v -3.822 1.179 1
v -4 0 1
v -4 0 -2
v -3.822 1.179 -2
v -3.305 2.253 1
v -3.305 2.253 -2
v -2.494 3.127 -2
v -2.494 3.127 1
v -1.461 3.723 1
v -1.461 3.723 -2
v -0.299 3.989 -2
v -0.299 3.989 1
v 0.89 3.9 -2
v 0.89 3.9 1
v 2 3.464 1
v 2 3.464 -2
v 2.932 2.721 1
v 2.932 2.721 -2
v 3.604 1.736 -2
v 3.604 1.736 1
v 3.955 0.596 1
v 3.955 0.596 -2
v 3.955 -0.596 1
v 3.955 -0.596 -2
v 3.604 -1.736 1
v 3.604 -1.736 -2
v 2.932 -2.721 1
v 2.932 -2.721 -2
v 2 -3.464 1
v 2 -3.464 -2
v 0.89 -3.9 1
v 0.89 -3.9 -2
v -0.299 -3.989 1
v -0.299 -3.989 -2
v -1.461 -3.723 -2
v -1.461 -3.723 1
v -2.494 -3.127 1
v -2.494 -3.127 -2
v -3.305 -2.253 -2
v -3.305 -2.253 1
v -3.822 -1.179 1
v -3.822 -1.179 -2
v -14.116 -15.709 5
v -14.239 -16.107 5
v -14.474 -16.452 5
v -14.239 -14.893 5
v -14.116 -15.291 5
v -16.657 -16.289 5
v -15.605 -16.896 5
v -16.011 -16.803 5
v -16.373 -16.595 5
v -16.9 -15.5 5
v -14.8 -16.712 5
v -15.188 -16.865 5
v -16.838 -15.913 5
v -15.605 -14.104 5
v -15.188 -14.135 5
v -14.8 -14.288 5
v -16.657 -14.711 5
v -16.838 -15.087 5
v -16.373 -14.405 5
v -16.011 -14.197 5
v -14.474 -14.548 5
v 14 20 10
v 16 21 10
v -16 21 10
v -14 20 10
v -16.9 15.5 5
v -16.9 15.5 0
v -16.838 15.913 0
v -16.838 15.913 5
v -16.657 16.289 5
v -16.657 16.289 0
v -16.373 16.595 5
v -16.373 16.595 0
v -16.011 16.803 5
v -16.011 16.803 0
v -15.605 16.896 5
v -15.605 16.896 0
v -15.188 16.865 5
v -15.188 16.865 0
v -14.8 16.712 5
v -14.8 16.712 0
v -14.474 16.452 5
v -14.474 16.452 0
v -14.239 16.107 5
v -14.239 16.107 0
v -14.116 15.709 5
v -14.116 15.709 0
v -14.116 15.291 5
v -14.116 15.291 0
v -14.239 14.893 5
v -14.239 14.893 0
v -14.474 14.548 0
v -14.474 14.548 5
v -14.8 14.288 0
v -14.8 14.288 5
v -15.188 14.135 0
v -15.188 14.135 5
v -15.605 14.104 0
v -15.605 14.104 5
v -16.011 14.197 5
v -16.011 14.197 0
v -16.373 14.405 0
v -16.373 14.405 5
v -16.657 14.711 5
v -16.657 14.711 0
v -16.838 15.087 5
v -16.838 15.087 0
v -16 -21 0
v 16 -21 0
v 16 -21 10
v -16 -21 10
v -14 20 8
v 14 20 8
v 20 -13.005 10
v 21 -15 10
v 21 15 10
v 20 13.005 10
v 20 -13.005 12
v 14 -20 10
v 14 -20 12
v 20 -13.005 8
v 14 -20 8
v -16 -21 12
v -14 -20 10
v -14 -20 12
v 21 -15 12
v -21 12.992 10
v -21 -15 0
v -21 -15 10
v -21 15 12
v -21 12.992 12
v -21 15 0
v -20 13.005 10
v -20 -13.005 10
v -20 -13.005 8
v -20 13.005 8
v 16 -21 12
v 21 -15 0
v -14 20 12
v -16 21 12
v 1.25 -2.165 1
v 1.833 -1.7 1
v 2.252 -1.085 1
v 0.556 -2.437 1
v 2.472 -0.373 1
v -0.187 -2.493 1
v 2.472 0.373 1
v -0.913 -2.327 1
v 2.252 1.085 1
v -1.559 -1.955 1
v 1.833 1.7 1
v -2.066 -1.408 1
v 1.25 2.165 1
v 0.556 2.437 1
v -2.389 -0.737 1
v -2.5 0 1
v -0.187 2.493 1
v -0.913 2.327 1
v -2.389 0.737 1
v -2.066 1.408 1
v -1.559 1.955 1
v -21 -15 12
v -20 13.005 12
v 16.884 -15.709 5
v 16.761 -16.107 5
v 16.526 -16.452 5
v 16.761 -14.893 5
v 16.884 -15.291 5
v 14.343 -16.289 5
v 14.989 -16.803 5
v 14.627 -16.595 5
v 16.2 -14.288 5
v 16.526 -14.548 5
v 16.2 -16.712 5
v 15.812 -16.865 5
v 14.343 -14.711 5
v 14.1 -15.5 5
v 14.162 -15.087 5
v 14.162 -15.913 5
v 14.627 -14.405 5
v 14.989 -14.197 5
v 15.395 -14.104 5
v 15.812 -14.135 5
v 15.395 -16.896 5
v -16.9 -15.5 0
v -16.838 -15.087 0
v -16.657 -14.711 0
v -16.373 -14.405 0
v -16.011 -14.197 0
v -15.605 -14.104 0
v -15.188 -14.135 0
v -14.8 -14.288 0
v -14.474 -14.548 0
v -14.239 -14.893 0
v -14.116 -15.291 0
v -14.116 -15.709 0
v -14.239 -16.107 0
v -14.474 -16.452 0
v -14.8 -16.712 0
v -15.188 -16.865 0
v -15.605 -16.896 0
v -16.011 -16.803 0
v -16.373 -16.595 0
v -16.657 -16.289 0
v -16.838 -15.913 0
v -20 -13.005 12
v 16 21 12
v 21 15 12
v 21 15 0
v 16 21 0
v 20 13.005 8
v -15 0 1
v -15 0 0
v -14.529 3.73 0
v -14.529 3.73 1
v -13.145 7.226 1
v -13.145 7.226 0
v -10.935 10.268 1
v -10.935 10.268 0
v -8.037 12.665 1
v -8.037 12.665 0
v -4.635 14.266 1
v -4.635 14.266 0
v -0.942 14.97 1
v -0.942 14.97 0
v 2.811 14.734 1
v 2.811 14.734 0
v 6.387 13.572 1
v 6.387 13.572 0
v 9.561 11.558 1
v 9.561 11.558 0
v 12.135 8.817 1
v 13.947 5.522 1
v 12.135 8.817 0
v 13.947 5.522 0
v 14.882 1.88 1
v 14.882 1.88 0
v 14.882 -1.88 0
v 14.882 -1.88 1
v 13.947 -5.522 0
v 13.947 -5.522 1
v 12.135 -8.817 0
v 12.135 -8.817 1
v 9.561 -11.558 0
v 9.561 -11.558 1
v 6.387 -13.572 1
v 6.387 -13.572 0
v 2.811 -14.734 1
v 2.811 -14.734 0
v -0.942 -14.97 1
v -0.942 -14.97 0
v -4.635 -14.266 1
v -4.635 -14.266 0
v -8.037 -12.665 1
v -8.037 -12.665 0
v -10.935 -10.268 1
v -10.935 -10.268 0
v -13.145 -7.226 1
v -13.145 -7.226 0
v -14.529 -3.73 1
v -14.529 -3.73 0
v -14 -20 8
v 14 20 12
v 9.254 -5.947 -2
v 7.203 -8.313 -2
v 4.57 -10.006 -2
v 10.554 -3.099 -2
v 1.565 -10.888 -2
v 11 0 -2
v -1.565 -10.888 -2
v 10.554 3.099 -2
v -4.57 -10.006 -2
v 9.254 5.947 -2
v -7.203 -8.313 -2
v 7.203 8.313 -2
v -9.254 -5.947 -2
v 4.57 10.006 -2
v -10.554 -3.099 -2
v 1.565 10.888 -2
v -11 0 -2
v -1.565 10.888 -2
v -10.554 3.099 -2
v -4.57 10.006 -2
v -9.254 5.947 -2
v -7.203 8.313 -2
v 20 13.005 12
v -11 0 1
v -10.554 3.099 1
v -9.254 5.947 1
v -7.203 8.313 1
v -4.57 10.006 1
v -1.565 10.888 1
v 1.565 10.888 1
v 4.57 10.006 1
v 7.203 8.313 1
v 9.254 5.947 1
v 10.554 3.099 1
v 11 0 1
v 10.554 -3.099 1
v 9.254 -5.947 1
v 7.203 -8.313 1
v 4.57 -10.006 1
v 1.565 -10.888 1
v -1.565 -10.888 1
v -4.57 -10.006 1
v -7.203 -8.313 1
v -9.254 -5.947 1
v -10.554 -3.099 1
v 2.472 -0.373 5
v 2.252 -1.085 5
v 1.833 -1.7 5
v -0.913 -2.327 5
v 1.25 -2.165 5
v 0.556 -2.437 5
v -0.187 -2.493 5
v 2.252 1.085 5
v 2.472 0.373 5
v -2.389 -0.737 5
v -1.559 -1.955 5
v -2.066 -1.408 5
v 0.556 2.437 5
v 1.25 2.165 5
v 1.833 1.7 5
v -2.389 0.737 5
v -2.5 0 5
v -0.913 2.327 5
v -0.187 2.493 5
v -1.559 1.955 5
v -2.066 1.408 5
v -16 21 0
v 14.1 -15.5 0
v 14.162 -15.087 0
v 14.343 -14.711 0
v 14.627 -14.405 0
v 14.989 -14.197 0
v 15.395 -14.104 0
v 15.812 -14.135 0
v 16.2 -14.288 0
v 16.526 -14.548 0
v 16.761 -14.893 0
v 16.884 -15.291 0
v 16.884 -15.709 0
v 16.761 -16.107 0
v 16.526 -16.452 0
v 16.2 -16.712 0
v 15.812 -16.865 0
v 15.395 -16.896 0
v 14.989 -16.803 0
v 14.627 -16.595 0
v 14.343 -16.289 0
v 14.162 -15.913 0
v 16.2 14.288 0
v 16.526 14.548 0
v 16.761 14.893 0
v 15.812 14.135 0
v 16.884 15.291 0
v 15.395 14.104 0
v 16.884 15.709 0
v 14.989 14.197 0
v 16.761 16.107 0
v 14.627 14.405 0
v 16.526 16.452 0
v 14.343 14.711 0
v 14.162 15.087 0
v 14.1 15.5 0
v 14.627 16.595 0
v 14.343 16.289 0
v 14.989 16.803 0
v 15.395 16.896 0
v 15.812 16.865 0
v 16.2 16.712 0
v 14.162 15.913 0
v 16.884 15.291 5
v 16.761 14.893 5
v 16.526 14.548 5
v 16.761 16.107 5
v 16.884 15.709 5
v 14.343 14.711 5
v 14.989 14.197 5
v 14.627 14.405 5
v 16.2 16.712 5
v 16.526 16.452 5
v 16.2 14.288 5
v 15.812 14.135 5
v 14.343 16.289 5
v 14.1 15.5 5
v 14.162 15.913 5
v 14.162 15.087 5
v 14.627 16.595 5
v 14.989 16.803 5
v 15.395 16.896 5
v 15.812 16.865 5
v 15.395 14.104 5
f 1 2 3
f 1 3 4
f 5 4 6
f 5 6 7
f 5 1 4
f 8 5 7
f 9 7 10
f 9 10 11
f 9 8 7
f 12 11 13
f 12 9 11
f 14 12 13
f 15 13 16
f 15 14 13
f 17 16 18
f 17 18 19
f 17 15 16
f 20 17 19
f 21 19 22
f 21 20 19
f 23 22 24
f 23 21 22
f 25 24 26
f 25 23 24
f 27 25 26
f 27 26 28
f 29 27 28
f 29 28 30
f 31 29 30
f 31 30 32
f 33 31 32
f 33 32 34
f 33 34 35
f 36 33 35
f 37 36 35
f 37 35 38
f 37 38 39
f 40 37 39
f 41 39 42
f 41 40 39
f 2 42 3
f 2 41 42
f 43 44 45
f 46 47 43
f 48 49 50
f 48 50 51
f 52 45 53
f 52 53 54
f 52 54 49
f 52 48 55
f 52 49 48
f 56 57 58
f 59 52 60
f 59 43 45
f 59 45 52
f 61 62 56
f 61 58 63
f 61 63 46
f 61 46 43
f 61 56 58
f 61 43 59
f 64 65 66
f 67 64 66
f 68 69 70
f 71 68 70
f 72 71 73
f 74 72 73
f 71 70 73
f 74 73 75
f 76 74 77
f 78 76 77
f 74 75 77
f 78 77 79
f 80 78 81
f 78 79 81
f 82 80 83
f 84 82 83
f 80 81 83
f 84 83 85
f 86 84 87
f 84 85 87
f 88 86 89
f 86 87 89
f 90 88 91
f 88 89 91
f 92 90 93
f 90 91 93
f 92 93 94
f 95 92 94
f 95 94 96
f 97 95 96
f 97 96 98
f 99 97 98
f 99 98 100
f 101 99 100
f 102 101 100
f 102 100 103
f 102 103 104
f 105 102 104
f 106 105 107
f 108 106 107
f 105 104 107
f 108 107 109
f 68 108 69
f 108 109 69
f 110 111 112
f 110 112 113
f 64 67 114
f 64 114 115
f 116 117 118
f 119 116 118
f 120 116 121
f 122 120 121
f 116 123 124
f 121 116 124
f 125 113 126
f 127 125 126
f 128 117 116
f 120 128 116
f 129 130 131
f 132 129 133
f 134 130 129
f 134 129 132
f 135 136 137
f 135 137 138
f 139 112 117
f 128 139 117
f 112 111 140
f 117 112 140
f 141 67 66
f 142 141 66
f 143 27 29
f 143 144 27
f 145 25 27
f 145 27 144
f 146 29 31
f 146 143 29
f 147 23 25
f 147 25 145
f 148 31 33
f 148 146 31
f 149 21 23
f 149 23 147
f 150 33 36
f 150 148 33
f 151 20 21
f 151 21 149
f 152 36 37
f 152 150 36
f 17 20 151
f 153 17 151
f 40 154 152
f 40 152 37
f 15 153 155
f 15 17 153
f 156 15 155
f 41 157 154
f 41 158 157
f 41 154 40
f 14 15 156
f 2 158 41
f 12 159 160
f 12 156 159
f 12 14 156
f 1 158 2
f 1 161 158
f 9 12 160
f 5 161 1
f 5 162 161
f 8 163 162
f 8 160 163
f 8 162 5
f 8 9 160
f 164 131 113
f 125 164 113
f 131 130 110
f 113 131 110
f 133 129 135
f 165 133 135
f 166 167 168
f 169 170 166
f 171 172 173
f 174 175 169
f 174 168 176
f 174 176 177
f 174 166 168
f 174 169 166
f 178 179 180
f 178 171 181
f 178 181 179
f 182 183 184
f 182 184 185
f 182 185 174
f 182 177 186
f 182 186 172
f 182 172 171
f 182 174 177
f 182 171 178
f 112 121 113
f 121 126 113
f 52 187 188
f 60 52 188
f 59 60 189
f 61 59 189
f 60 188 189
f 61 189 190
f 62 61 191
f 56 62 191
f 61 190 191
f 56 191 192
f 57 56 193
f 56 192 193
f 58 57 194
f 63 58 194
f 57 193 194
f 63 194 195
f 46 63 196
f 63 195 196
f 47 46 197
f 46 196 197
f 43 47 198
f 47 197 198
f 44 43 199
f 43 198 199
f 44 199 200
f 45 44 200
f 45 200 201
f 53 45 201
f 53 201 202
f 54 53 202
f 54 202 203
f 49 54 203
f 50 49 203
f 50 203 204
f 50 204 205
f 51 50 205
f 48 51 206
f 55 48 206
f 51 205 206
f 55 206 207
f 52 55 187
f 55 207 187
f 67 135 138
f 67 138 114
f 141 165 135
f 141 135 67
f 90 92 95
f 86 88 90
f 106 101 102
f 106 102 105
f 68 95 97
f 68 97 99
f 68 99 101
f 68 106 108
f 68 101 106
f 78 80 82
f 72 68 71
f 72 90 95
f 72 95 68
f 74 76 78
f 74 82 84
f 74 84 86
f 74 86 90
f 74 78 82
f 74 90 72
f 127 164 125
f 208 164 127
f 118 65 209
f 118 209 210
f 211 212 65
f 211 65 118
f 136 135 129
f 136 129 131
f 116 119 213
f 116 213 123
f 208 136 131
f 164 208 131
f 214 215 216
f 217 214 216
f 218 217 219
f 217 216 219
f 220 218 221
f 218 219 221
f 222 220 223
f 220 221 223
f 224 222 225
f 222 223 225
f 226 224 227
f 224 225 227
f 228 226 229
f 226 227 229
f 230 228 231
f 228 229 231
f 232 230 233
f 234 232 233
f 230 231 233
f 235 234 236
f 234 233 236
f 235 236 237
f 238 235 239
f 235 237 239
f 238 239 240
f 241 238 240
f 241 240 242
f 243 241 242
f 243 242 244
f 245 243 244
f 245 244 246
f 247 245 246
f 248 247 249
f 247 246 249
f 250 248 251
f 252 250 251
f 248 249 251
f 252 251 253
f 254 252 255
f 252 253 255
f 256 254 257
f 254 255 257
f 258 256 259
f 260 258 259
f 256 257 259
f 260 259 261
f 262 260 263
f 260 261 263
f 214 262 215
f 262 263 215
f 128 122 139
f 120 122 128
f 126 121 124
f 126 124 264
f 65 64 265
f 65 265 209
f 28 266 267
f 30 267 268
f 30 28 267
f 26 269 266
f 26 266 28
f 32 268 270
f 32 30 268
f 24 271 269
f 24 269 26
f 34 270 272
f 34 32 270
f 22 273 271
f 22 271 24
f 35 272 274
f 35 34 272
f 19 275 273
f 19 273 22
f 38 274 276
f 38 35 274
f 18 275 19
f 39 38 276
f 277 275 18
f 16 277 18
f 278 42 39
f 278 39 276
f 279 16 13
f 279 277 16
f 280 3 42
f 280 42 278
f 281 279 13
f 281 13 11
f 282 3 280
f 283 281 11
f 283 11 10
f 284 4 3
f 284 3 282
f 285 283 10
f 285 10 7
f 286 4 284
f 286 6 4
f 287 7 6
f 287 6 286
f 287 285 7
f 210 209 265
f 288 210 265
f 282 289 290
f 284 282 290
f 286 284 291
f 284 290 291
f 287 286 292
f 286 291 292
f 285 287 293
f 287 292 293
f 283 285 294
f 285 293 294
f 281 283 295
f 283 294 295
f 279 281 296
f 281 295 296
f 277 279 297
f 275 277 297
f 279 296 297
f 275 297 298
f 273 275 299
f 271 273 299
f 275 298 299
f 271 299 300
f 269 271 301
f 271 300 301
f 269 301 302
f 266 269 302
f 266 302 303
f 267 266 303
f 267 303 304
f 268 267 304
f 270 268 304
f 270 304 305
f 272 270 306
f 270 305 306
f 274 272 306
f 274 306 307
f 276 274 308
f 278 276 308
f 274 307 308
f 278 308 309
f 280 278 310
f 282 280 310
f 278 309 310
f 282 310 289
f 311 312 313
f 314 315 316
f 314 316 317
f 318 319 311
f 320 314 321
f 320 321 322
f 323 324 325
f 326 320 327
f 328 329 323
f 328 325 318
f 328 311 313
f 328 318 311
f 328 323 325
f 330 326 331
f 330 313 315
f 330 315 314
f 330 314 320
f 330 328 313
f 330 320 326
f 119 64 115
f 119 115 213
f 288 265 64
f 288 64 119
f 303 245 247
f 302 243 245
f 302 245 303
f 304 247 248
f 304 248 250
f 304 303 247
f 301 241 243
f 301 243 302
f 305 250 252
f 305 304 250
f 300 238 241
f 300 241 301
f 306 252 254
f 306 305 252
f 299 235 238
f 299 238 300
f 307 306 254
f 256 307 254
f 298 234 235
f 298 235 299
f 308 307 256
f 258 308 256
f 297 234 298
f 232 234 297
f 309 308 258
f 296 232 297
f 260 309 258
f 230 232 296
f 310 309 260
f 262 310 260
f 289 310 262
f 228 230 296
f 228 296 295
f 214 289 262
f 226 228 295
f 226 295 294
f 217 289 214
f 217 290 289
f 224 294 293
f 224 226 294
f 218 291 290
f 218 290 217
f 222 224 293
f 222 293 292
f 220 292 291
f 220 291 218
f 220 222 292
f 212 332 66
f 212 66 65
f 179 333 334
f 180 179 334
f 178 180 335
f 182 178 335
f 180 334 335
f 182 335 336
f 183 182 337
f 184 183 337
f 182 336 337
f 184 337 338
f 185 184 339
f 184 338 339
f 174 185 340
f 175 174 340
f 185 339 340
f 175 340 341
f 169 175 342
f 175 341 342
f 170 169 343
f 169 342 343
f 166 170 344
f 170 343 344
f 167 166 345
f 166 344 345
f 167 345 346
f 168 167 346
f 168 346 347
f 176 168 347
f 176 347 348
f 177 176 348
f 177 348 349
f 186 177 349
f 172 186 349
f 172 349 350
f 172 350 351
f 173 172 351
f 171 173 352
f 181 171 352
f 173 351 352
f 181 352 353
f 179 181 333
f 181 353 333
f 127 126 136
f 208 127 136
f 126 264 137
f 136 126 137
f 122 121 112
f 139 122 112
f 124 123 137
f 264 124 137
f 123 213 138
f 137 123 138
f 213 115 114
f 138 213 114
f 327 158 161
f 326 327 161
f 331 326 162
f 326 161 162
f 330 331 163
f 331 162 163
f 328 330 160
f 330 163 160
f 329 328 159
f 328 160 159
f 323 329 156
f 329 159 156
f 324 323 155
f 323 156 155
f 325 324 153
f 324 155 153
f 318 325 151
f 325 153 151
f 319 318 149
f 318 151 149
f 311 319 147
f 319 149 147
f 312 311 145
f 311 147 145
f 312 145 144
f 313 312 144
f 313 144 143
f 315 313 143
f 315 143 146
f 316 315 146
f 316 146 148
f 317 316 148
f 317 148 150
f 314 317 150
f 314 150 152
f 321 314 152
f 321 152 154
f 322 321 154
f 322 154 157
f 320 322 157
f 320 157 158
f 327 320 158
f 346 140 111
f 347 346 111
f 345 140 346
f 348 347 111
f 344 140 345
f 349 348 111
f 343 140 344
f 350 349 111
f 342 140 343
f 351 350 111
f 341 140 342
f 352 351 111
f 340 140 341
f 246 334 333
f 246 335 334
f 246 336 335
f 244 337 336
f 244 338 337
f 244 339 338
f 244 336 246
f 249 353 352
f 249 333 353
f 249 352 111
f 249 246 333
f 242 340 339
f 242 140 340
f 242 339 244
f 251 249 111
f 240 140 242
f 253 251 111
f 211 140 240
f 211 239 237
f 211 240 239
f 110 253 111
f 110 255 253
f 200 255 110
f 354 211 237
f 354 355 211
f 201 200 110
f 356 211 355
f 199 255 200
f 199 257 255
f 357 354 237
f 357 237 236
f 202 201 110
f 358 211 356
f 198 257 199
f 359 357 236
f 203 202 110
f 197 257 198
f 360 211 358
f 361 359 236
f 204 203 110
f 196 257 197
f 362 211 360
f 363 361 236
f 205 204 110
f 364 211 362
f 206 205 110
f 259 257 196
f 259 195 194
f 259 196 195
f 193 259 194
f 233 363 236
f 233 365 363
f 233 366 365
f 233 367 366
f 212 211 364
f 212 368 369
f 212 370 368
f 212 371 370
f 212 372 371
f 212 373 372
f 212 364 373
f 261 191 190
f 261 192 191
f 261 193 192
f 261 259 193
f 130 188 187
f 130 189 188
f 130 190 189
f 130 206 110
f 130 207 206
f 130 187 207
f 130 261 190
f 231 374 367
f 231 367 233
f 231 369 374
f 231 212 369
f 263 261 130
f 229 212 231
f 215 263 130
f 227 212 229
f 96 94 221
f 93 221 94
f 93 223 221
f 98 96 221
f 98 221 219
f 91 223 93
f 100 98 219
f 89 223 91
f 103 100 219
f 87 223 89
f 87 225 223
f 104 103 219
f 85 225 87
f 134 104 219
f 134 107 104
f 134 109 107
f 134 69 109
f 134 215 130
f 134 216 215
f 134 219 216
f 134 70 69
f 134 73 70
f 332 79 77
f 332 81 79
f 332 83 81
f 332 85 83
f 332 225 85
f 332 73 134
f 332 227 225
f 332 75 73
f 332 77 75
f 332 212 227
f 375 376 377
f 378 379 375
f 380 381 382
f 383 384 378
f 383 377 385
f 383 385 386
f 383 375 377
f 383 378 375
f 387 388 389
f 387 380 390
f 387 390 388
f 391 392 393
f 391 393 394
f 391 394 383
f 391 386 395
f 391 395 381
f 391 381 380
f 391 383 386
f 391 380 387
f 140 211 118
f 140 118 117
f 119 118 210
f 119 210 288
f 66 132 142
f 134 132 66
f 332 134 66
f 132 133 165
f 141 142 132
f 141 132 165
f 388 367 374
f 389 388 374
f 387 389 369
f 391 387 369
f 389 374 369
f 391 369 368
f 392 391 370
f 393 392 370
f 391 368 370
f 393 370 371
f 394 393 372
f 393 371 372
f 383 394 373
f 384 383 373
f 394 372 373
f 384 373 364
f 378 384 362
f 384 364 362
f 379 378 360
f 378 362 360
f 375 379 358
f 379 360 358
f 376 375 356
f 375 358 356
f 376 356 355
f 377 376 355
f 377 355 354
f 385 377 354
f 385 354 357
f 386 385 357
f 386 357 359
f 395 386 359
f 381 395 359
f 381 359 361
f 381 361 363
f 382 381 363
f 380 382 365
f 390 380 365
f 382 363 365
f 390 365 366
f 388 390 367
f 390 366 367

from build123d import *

# Parameters (mm, degrees)
SALIENTE_EXTRUIR1_DEPTH = 10
CORTAR_EXTRUIR1_DEPTH   = 2
SALIENTE_EXTRUIR2_DEPTH = 2
CROQUIS5_R              = 1.4
CROQUIS5_R_2            = 2.5
CORTAR_EXTRUIR2_DEPTH   = 5
CROQUIS6_R              = 15
CORTAR_EXTRUIR3_DEPTH   = 1
CROQUIS7_R              = 11
CROQUIS7_R_2            = 4
SALIENTE_EXTRUIR3_DEPTH = 3


with BuildPart() as part:
    # Croquis2 → Saliente-Extruir1 (new body)
    with BuildSketch(Plane.XY):
        Polygon((-16, 21), (16, 21), (21, 15), (21, -15), (16, -21), (-16, -21), (-21, -15), (-21, 15), align=None)
    extrude(amount=SALIENTE_EXTRUIR1_DEPTH)

    # Croquis3 → Cortar-Extruir1 (cut)
    with BuildSketch(Plane.XY.offset(10)):
        Polygon((-14, 20), (14, 20), (20, 13.004934109), (20, -13.004934109), (14, -20), (-14, -20), (-20, -13.004934109), (-20, 13.004934109), align=None)
    extrude(amount=-CORTAR_EXTRUIR1_DEPTH, mode=Mode.SUBTRACT)

    # Croquis4 → Saliente-Extruir2 (add)
    with BuildSketch(Plane.XY.offset(10)):
        Polygon((-16, -21), (-14, -20), (-20, -13.004934109), (-21, -15), align=None)
        Polygon((-20, 13.004934109), (-14, 20), (-16, 21), (-21, 15), (-21, 12.992008233), align=None)
        Polygon((16, 21), (21, 15), (20, 13.004934109), (14, 20), align=None)
        Polygon((16, -21), (21, -15), (20, -13.004934109), (14, -20), align=None)
    extrude(amount=SALIENTE_EXTRUIR2_DEPTH)

    # Croquis5 → Cortar-Extruir2 (cut)
    with BuildSketch(Plane(origin=(0, 0, 0), x_dir=(-1, 0, 0), z_dir=(0, 0, -1))):
        with Locations((15.5, 15.5)):
            Circle(CROQUIS5_R)
        with Locations((-15.5, 15.5)):
            Circle(CROQUIS5_R)
        with Locations((15.5, -15.5)):
            Circle(CROQUIS5_R)
        with Locations((-15.5, -15.5)):
            Circle(CROQUIS5_R)
        Circle(CROQUIS5_R_2)
    extrude(amount=-CORTAR_EXTRUIR2_DEPTH, mode=Mode.SUBTRACT)

    # Croquis6 → Cortar-Extruir3 (cut)
    with BuildSketch(Plane(origin=(0, 0, 0), x_dir=(-1, 0, 0), z_dir=(0, 0, -1))):
        Circle(CROQUIS6_R)
    extrude(amount=-CORTAR_EXTRUIR3_DEPTH, mode=Mode.SUBTRACT)

    # Croquis7 → Saliente-Extruir3 (add)
    with BuildSketch(Plane(origin=(0, 0, 1), x_dir=(-1, 0, 0), z_dir=(0, 0, -1))):
        Circle(CROQUIS7_R)
        Circle(CROQUIS7_R_2, mode=Mode.SUBTRACT)
    extrude(amount=SALIENTE_EXTRUIR3_DEPTH)


solid = part.part
